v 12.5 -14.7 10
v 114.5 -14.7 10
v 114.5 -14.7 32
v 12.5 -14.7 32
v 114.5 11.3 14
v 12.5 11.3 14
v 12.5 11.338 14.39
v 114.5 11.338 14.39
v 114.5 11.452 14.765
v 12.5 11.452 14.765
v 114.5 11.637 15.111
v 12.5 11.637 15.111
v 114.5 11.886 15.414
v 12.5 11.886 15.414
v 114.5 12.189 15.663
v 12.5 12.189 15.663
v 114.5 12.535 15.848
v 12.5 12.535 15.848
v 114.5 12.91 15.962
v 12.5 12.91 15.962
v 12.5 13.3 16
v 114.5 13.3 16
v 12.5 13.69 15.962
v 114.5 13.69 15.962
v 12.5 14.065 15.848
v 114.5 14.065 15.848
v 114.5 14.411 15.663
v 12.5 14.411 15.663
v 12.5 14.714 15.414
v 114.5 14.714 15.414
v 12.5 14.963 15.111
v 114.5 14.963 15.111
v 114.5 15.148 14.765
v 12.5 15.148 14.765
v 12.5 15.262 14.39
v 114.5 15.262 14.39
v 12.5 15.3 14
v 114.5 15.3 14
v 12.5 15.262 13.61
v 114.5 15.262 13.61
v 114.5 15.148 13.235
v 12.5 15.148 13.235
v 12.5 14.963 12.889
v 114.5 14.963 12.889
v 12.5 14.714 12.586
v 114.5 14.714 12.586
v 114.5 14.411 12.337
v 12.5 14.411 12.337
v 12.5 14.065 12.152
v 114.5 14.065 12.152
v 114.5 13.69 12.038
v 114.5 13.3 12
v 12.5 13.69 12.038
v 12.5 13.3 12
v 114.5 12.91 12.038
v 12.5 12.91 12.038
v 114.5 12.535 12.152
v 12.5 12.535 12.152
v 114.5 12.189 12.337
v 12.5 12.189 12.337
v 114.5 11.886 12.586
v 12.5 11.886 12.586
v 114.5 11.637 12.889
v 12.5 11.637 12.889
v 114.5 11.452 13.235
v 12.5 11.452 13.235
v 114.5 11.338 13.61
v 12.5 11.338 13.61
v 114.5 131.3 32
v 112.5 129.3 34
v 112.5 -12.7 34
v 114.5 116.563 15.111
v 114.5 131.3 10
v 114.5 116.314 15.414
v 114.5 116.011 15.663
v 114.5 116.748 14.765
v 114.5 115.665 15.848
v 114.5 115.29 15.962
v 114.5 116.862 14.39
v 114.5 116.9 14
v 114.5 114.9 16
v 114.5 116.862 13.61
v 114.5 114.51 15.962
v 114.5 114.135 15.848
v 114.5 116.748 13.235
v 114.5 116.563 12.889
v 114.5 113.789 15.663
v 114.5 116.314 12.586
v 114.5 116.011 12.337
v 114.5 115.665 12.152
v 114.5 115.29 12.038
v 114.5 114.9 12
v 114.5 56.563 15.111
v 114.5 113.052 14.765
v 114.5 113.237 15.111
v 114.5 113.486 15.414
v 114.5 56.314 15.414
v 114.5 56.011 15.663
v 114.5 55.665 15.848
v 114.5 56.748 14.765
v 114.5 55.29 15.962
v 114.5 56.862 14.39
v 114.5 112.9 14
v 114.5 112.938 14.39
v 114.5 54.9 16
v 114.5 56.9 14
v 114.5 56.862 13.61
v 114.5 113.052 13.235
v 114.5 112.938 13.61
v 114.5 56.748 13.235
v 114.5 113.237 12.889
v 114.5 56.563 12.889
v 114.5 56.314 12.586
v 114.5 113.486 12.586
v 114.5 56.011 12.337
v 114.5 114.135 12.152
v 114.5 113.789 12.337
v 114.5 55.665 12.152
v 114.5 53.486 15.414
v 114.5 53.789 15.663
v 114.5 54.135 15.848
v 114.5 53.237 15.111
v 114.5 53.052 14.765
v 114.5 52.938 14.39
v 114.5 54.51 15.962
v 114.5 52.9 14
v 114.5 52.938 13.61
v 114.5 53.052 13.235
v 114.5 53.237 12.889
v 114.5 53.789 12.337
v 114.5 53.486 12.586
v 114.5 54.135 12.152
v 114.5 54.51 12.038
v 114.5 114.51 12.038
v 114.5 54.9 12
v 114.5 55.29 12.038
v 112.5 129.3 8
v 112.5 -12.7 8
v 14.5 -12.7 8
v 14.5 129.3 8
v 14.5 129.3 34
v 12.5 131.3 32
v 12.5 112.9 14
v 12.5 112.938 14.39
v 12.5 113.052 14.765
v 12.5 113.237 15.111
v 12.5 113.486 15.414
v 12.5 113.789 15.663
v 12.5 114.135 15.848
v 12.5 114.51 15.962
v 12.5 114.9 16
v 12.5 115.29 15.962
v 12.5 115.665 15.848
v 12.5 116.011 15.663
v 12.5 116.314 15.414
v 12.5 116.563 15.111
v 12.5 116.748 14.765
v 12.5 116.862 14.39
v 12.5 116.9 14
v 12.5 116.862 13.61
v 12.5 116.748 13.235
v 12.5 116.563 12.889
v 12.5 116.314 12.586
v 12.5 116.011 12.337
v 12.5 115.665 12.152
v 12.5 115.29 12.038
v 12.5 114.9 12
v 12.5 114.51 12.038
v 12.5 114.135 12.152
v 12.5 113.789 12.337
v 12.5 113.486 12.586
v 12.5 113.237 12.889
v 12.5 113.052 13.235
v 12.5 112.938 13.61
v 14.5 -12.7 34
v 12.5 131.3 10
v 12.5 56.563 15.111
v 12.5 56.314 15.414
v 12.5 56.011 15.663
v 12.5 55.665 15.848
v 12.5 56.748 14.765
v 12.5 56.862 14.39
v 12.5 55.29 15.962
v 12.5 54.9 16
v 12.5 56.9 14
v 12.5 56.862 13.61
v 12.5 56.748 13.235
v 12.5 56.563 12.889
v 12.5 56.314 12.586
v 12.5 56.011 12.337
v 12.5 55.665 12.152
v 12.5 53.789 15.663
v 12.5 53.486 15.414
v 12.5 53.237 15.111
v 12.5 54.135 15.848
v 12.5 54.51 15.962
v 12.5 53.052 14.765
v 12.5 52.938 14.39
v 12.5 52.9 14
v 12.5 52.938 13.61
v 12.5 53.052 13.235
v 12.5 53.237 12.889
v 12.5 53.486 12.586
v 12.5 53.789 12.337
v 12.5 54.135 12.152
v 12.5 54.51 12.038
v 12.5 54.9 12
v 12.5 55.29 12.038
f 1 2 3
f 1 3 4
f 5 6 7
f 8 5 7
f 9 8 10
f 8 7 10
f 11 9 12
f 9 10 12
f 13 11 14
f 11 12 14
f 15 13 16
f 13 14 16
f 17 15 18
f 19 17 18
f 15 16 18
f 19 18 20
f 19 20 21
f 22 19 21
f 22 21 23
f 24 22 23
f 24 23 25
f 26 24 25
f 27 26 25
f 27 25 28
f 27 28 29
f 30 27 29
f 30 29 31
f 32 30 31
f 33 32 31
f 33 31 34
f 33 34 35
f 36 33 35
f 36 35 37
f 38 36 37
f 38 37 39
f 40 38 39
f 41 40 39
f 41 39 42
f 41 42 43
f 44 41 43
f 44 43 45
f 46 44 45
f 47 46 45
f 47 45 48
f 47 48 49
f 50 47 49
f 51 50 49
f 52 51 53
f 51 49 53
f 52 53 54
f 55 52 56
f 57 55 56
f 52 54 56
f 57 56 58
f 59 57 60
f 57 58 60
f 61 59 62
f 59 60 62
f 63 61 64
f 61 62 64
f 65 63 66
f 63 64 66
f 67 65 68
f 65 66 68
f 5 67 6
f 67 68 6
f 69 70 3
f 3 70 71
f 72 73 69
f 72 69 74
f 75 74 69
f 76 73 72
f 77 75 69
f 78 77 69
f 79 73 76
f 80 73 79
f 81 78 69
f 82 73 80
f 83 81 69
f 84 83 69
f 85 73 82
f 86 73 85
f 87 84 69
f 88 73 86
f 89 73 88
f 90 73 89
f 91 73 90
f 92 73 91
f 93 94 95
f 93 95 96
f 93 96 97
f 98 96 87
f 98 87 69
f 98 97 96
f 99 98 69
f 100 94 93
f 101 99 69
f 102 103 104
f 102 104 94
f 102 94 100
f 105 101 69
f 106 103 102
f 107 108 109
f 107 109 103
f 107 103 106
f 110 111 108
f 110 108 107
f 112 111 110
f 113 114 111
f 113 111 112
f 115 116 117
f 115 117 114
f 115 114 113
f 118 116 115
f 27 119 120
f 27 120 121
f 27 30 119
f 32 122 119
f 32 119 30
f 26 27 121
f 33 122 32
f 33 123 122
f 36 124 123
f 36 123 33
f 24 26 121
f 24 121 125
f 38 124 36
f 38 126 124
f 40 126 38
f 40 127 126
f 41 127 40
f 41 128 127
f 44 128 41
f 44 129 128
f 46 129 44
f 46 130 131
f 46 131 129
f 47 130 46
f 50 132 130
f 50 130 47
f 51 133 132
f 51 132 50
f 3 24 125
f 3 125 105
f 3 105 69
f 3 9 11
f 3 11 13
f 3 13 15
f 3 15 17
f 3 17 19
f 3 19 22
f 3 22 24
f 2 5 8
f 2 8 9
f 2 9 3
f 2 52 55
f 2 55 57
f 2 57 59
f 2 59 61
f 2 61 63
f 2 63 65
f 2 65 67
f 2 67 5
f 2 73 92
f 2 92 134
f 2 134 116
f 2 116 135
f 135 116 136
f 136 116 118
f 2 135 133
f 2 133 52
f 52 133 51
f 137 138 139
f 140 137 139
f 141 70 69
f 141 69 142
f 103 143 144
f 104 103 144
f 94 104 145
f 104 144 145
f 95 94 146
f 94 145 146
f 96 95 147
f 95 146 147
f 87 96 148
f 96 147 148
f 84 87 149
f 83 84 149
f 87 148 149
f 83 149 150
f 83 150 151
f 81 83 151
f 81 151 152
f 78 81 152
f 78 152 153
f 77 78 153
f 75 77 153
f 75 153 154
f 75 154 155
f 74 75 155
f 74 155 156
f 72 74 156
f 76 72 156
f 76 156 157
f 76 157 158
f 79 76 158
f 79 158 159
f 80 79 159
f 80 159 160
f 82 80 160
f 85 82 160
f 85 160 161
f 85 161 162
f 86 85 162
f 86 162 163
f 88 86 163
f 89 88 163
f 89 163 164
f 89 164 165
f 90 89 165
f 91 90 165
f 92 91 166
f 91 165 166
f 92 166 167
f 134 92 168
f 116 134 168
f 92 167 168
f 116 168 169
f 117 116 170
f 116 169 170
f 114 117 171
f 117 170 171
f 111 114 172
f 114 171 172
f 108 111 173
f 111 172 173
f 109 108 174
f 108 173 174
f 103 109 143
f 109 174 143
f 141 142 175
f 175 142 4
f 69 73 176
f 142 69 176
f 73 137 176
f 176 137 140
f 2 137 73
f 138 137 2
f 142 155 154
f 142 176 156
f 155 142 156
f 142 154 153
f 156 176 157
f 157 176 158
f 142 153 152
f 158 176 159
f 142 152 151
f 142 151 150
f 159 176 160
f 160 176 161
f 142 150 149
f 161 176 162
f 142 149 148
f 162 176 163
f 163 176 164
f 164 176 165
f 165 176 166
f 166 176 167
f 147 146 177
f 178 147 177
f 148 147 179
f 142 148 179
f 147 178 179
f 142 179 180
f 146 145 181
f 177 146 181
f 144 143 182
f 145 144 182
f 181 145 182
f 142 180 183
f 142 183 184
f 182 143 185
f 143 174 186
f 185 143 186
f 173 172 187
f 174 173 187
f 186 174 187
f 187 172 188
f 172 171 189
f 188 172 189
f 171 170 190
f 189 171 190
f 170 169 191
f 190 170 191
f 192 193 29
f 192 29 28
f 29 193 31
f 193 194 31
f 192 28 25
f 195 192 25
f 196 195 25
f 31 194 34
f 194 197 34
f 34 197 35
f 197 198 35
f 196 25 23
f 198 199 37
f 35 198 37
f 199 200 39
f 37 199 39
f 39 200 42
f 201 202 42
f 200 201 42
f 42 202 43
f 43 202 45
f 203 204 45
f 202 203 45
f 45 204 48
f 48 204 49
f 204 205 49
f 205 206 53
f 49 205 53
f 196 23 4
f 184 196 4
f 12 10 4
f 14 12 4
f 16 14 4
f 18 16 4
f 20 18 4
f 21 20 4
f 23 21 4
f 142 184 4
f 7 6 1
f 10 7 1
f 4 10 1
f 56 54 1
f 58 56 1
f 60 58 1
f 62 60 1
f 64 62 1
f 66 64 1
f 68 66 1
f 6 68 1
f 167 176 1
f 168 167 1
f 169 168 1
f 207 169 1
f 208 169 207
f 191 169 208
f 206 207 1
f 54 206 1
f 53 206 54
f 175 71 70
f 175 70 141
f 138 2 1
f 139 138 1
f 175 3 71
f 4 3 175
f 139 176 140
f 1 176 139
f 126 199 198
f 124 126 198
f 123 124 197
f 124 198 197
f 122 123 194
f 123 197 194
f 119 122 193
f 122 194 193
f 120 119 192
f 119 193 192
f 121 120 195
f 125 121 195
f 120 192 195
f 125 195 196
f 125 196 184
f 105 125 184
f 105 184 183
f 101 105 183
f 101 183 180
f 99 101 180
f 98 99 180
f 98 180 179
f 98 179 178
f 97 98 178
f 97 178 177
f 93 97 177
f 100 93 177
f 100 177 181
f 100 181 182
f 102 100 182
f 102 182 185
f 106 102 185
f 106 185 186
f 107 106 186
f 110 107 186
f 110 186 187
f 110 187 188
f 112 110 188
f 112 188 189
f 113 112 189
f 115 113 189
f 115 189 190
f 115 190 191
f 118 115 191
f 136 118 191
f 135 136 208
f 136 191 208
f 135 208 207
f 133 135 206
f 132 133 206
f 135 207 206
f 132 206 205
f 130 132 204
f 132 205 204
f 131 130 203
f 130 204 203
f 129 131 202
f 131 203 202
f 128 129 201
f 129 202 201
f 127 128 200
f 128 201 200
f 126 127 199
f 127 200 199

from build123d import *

# Parameters (mm, degrees)
SKETCH046_W             = 102
SKETCH046_H             = 146
PAD012_DEPTH            = 26
SKETCH047_R             = 2
POCKET033_DEPTH         = 102.001
CHAMFER001_SIZE         = 2
BODY010_PLACEMENT_ANGLE = 180


with BuildPart() as part:
    # Sketch046 → Pad012 (new body)
    with BuildSketch(Plane.XY):
        Rectangle(SKETCH046_W, SKETCH046_H)
    extrude(amount=PAD012_DEPTH)

    # Sketch047 (on Face3 of Pad012) → Pocket033 (cut, through all)
    with BuildSketch(Plane.YZ.offset(51)):
        with Locations((45, 6)):
            Circle(SKETCH047_R)
        with Locations((3.4, 6)):
            Circle(SKETCH047_R)
        with Locations((-56.6, 6)):
            Circle(SKETCH047_R)
    extrude(amount=-POCKET033_DEPTH, mode=Mode.SUBTRACT)

    # Chamfer001
    chamfer001_edges = [part.edges().sort_by_distance(p)[0] for p in [
        (-51, 0, 0),
        (0, -73, 0),
        (51, 0, 0),
        (0, 73, 0),
        (-51, 0, 26),
        (0, -73, 26),
        (51, 0, 26),
        (0, 73, 26),
    ]]
    chamfer(chamfer001_edges, length=CHAMFER001_SIZE)


with BuildPart() as part_1:
    # Body010 placement: moved
    add(part.part.moved(Location((63.5, 58.3, 8))).rotate(Axis((63.5, 58.3, 8), (0, 0, 1)), BODY010_PLACEMENT_ANGLE))


solid = part_1.part
